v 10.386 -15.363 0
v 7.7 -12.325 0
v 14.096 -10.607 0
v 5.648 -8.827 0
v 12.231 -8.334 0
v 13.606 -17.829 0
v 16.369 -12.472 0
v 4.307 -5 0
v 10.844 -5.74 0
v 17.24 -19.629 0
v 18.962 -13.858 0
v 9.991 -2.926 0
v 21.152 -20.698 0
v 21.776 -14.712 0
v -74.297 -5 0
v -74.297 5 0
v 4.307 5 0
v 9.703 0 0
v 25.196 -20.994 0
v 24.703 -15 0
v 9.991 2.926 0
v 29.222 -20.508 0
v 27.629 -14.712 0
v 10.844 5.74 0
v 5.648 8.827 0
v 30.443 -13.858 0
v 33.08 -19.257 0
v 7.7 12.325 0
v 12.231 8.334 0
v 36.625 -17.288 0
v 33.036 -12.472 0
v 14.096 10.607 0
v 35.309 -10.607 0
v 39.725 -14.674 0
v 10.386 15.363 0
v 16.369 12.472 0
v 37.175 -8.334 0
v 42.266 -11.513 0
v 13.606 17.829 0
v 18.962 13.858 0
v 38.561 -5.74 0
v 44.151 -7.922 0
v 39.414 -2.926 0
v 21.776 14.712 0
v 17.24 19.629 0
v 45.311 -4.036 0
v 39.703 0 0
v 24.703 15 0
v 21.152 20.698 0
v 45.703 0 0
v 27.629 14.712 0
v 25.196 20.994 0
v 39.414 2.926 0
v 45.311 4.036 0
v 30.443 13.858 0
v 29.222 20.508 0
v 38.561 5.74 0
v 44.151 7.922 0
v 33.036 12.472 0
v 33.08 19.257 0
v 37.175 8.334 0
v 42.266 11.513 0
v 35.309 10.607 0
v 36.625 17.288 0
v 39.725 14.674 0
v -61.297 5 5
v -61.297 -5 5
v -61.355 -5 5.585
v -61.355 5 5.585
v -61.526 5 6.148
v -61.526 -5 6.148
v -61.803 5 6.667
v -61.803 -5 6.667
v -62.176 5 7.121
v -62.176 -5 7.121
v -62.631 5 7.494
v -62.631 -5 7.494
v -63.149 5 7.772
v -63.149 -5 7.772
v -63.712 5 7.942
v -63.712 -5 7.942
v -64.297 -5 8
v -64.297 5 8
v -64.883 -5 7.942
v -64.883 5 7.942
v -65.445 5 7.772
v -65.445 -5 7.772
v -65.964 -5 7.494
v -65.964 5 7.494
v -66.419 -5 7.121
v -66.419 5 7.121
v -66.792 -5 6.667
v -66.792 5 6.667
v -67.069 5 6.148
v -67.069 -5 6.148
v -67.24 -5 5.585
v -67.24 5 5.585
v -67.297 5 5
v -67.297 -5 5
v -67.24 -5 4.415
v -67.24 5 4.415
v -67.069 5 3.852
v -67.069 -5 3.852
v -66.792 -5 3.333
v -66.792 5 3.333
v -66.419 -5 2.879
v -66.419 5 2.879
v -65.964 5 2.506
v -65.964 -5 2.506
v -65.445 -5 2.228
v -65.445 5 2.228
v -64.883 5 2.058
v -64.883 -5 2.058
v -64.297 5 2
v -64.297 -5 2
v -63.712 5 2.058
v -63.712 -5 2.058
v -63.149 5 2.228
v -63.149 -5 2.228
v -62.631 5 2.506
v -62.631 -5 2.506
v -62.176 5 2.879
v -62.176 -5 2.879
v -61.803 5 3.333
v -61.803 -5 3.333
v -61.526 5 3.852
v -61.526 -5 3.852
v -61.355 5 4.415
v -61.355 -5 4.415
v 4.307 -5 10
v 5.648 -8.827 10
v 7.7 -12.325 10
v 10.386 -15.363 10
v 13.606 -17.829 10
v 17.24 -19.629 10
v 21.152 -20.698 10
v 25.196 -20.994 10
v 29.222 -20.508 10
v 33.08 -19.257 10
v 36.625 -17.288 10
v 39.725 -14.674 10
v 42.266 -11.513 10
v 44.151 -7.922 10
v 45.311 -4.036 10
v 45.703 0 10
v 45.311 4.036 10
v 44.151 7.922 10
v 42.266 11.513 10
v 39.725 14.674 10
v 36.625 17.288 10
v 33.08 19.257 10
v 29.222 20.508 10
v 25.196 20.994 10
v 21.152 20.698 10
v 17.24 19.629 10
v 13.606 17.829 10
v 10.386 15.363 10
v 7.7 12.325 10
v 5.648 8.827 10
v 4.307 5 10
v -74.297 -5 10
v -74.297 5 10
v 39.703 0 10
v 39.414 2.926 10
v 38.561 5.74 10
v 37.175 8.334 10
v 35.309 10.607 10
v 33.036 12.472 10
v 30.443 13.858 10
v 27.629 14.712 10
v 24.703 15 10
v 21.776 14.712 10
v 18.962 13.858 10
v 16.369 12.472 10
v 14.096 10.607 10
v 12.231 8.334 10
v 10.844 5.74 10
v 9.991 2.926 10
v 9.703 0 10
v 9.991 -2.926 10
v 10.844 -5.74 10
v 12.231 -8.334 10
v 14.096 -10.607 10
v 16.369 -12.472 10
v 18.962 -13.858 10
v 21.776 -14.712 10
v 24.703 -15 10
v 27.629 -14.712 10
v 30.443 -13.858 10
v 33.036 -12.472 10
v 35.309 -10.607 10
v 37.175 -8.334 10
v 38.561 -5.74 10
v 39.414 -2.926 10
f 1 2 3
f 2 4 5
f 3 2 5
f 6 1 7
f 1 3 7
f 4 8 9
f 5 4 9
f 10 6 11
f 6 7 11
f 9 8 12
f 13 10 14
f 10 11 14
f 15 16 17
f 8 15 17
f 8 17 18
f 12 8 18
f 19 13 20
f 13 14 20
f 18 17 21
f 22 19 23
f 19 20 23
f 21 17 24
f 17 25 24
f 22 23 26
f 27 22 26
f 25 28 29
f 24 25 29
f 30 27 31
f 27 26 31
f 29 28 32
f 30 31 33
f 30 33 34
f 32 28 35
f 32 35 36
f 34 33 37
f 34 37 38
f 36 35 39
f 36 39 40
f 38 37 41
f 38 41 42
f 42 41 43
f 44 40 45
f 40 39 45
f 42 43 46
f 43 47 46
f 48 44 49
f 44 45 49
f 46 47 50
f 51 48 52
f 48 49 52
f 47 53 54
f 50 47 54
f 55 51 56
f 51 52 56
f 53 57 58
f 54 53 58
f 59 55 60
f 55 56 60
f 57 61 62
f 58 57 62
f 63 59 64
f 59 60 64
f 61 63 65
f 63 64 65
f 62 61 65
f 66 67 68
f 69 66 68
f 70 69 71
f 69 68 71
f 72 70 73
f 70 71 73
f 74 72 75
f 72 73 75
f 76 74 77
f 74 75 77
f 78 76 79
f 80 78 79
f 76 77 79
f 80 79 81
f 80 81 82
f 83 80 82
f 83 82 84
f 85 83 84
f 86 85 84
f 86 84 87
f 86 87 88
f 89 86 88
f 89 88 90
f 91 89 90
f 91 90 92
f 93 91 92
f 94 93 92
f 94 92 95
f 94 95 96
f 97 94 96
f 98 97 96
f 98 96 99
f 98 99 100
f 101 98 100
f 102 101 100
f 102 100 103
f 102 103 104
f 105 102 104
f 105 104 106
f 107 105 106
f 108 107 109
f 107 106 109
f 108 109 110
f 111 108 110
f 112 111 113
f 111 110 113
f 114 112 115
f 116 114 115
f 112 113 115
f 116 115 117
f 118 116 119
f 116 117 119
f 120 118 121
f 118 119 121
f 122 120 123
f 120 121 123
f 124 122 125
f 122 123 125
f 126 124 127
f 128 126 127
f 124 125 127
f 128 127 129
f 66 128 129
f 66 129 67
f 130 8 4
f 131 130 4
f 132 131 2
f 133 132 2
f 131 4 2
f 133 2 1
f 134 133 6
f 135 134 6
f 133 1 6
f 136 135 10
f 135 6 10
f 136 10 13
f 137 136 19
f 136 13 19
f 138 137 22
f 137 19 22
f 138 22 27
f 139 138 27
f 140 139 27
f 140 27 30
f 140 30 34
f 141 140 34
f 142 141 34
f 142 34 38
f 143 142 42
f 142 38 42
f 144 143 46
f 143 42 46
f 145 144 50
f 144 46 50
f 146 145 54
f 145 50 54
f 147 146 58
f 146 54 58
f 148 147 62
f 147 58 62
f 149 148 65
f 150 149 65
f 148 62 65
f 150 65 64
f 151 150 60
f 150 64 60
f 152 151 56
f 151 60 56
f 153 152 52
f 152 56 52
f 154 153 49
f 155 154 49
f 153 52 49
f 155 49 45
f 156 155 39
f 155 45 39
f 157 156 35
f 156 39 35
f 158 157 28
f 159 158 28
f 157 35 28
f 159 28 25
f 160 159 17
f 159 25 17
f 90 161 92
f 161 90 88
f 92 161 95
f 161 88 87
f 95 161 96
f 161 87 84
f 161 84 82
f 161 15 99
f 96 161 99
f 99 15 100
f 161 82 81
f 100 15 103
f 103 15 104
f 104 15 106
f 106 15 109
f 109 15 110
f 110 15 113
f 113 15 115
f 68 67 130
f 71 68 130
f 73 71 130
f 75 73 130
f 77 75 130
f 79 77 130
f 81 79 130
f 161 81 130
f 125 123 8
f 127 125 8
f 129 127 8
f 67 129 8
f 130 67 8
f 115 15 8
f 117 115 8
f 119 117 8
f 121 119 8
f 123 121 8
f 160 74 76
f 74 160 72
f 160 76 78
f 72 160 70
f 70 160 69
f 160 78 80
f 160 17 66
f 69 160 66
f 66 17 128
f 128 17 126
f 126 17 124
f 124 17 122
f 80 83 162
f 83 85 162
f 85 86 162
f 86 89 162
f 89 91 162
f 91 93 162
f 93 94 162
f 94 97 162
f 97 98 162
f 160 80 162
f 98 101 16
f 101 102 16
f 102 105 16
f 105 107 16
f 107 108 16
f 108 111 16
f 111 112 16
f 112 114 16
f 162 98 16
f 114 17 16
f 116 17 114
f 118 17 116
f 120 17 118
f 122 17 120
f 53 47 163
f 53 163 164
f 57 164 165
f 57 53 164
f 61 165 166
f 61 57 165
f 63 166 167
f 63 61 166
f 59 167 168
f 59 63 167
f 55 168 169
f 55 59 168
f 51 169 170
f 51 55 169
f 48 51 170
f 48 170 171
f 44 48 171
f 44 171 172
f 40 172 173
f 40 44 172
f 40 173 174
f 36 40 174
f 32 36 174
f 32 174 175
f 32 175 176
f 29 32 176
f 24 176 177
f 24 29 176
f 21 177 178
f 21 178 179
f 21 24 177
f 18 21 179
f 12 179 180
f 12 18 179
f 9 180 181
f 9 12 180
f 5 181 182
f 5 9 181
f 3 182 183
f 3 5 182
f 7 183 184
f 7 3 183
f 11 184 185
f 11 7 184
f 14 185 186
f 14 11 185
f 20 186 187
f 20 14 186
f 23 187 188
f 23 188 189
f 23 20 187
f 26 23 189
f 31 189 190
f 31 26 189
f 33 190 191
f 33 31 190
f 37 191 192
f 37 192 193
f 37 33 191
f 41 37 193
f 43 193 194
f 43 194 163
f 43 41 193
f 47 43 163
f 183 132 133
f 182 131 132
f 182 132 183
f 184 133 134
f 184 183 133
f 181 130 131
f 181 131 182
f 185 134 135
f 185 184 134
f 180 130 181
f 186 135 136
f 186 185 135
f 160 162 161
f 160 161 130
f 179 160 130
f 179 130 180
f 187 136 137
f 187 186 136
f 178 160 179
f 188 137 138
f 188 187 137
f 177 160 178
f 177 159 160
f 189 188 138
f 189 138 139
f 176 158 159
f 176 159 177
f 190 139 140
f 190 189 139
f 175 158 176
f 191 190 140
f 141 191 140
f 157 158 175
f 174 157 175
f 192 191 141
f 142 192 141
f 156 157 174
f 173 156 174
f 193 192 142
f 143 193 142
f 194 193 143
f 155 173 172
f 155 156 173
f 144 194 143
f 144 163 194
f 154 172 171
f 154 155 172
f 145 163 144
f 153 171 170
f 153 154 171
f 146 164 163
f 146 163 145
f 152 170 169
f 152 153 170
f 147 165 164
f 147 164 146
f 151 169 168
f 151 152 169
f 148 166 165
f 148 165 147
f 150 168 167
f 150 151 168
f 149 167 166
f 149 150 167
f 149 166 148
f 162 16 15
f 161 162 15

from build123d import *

# Parameters (mm, degrees)
F0_R     = 15
F1_DEPTH = 10
F2_R     = 3
F3_DEPTH = 25


with BuildPart() as f1:
    # F0 (on Top) → F1 (new body)
    with BuildSketch(Plane.XY):
        with BuildLine():
            Line((4.306584, 5), (-74.297338, 5))
            Line((-74.297338, 5), (-74.297338, -5))
            Line((-74.297338, -5), (4.306584, -5))
            ThreePointArc((4.306584, -5), (45.702662, 0), (4.306584, 5))
        make_face()
        with Locations((24.702662, 0)):
            Circle(F0_R, mode=Mode.SUBTRACT)
    extrude(amount=F1_DEPTH)

    # F2 (on face) → F3 (cut)
    with BuildSketch(Plane.XZ.offset(5)):
        with Locations((-64.297338, 5)):
            Circle(F2_R)
    extrude(amount=-F3_DEPTH, mode=Mode.SUBTRACT)


solid = f1.part
